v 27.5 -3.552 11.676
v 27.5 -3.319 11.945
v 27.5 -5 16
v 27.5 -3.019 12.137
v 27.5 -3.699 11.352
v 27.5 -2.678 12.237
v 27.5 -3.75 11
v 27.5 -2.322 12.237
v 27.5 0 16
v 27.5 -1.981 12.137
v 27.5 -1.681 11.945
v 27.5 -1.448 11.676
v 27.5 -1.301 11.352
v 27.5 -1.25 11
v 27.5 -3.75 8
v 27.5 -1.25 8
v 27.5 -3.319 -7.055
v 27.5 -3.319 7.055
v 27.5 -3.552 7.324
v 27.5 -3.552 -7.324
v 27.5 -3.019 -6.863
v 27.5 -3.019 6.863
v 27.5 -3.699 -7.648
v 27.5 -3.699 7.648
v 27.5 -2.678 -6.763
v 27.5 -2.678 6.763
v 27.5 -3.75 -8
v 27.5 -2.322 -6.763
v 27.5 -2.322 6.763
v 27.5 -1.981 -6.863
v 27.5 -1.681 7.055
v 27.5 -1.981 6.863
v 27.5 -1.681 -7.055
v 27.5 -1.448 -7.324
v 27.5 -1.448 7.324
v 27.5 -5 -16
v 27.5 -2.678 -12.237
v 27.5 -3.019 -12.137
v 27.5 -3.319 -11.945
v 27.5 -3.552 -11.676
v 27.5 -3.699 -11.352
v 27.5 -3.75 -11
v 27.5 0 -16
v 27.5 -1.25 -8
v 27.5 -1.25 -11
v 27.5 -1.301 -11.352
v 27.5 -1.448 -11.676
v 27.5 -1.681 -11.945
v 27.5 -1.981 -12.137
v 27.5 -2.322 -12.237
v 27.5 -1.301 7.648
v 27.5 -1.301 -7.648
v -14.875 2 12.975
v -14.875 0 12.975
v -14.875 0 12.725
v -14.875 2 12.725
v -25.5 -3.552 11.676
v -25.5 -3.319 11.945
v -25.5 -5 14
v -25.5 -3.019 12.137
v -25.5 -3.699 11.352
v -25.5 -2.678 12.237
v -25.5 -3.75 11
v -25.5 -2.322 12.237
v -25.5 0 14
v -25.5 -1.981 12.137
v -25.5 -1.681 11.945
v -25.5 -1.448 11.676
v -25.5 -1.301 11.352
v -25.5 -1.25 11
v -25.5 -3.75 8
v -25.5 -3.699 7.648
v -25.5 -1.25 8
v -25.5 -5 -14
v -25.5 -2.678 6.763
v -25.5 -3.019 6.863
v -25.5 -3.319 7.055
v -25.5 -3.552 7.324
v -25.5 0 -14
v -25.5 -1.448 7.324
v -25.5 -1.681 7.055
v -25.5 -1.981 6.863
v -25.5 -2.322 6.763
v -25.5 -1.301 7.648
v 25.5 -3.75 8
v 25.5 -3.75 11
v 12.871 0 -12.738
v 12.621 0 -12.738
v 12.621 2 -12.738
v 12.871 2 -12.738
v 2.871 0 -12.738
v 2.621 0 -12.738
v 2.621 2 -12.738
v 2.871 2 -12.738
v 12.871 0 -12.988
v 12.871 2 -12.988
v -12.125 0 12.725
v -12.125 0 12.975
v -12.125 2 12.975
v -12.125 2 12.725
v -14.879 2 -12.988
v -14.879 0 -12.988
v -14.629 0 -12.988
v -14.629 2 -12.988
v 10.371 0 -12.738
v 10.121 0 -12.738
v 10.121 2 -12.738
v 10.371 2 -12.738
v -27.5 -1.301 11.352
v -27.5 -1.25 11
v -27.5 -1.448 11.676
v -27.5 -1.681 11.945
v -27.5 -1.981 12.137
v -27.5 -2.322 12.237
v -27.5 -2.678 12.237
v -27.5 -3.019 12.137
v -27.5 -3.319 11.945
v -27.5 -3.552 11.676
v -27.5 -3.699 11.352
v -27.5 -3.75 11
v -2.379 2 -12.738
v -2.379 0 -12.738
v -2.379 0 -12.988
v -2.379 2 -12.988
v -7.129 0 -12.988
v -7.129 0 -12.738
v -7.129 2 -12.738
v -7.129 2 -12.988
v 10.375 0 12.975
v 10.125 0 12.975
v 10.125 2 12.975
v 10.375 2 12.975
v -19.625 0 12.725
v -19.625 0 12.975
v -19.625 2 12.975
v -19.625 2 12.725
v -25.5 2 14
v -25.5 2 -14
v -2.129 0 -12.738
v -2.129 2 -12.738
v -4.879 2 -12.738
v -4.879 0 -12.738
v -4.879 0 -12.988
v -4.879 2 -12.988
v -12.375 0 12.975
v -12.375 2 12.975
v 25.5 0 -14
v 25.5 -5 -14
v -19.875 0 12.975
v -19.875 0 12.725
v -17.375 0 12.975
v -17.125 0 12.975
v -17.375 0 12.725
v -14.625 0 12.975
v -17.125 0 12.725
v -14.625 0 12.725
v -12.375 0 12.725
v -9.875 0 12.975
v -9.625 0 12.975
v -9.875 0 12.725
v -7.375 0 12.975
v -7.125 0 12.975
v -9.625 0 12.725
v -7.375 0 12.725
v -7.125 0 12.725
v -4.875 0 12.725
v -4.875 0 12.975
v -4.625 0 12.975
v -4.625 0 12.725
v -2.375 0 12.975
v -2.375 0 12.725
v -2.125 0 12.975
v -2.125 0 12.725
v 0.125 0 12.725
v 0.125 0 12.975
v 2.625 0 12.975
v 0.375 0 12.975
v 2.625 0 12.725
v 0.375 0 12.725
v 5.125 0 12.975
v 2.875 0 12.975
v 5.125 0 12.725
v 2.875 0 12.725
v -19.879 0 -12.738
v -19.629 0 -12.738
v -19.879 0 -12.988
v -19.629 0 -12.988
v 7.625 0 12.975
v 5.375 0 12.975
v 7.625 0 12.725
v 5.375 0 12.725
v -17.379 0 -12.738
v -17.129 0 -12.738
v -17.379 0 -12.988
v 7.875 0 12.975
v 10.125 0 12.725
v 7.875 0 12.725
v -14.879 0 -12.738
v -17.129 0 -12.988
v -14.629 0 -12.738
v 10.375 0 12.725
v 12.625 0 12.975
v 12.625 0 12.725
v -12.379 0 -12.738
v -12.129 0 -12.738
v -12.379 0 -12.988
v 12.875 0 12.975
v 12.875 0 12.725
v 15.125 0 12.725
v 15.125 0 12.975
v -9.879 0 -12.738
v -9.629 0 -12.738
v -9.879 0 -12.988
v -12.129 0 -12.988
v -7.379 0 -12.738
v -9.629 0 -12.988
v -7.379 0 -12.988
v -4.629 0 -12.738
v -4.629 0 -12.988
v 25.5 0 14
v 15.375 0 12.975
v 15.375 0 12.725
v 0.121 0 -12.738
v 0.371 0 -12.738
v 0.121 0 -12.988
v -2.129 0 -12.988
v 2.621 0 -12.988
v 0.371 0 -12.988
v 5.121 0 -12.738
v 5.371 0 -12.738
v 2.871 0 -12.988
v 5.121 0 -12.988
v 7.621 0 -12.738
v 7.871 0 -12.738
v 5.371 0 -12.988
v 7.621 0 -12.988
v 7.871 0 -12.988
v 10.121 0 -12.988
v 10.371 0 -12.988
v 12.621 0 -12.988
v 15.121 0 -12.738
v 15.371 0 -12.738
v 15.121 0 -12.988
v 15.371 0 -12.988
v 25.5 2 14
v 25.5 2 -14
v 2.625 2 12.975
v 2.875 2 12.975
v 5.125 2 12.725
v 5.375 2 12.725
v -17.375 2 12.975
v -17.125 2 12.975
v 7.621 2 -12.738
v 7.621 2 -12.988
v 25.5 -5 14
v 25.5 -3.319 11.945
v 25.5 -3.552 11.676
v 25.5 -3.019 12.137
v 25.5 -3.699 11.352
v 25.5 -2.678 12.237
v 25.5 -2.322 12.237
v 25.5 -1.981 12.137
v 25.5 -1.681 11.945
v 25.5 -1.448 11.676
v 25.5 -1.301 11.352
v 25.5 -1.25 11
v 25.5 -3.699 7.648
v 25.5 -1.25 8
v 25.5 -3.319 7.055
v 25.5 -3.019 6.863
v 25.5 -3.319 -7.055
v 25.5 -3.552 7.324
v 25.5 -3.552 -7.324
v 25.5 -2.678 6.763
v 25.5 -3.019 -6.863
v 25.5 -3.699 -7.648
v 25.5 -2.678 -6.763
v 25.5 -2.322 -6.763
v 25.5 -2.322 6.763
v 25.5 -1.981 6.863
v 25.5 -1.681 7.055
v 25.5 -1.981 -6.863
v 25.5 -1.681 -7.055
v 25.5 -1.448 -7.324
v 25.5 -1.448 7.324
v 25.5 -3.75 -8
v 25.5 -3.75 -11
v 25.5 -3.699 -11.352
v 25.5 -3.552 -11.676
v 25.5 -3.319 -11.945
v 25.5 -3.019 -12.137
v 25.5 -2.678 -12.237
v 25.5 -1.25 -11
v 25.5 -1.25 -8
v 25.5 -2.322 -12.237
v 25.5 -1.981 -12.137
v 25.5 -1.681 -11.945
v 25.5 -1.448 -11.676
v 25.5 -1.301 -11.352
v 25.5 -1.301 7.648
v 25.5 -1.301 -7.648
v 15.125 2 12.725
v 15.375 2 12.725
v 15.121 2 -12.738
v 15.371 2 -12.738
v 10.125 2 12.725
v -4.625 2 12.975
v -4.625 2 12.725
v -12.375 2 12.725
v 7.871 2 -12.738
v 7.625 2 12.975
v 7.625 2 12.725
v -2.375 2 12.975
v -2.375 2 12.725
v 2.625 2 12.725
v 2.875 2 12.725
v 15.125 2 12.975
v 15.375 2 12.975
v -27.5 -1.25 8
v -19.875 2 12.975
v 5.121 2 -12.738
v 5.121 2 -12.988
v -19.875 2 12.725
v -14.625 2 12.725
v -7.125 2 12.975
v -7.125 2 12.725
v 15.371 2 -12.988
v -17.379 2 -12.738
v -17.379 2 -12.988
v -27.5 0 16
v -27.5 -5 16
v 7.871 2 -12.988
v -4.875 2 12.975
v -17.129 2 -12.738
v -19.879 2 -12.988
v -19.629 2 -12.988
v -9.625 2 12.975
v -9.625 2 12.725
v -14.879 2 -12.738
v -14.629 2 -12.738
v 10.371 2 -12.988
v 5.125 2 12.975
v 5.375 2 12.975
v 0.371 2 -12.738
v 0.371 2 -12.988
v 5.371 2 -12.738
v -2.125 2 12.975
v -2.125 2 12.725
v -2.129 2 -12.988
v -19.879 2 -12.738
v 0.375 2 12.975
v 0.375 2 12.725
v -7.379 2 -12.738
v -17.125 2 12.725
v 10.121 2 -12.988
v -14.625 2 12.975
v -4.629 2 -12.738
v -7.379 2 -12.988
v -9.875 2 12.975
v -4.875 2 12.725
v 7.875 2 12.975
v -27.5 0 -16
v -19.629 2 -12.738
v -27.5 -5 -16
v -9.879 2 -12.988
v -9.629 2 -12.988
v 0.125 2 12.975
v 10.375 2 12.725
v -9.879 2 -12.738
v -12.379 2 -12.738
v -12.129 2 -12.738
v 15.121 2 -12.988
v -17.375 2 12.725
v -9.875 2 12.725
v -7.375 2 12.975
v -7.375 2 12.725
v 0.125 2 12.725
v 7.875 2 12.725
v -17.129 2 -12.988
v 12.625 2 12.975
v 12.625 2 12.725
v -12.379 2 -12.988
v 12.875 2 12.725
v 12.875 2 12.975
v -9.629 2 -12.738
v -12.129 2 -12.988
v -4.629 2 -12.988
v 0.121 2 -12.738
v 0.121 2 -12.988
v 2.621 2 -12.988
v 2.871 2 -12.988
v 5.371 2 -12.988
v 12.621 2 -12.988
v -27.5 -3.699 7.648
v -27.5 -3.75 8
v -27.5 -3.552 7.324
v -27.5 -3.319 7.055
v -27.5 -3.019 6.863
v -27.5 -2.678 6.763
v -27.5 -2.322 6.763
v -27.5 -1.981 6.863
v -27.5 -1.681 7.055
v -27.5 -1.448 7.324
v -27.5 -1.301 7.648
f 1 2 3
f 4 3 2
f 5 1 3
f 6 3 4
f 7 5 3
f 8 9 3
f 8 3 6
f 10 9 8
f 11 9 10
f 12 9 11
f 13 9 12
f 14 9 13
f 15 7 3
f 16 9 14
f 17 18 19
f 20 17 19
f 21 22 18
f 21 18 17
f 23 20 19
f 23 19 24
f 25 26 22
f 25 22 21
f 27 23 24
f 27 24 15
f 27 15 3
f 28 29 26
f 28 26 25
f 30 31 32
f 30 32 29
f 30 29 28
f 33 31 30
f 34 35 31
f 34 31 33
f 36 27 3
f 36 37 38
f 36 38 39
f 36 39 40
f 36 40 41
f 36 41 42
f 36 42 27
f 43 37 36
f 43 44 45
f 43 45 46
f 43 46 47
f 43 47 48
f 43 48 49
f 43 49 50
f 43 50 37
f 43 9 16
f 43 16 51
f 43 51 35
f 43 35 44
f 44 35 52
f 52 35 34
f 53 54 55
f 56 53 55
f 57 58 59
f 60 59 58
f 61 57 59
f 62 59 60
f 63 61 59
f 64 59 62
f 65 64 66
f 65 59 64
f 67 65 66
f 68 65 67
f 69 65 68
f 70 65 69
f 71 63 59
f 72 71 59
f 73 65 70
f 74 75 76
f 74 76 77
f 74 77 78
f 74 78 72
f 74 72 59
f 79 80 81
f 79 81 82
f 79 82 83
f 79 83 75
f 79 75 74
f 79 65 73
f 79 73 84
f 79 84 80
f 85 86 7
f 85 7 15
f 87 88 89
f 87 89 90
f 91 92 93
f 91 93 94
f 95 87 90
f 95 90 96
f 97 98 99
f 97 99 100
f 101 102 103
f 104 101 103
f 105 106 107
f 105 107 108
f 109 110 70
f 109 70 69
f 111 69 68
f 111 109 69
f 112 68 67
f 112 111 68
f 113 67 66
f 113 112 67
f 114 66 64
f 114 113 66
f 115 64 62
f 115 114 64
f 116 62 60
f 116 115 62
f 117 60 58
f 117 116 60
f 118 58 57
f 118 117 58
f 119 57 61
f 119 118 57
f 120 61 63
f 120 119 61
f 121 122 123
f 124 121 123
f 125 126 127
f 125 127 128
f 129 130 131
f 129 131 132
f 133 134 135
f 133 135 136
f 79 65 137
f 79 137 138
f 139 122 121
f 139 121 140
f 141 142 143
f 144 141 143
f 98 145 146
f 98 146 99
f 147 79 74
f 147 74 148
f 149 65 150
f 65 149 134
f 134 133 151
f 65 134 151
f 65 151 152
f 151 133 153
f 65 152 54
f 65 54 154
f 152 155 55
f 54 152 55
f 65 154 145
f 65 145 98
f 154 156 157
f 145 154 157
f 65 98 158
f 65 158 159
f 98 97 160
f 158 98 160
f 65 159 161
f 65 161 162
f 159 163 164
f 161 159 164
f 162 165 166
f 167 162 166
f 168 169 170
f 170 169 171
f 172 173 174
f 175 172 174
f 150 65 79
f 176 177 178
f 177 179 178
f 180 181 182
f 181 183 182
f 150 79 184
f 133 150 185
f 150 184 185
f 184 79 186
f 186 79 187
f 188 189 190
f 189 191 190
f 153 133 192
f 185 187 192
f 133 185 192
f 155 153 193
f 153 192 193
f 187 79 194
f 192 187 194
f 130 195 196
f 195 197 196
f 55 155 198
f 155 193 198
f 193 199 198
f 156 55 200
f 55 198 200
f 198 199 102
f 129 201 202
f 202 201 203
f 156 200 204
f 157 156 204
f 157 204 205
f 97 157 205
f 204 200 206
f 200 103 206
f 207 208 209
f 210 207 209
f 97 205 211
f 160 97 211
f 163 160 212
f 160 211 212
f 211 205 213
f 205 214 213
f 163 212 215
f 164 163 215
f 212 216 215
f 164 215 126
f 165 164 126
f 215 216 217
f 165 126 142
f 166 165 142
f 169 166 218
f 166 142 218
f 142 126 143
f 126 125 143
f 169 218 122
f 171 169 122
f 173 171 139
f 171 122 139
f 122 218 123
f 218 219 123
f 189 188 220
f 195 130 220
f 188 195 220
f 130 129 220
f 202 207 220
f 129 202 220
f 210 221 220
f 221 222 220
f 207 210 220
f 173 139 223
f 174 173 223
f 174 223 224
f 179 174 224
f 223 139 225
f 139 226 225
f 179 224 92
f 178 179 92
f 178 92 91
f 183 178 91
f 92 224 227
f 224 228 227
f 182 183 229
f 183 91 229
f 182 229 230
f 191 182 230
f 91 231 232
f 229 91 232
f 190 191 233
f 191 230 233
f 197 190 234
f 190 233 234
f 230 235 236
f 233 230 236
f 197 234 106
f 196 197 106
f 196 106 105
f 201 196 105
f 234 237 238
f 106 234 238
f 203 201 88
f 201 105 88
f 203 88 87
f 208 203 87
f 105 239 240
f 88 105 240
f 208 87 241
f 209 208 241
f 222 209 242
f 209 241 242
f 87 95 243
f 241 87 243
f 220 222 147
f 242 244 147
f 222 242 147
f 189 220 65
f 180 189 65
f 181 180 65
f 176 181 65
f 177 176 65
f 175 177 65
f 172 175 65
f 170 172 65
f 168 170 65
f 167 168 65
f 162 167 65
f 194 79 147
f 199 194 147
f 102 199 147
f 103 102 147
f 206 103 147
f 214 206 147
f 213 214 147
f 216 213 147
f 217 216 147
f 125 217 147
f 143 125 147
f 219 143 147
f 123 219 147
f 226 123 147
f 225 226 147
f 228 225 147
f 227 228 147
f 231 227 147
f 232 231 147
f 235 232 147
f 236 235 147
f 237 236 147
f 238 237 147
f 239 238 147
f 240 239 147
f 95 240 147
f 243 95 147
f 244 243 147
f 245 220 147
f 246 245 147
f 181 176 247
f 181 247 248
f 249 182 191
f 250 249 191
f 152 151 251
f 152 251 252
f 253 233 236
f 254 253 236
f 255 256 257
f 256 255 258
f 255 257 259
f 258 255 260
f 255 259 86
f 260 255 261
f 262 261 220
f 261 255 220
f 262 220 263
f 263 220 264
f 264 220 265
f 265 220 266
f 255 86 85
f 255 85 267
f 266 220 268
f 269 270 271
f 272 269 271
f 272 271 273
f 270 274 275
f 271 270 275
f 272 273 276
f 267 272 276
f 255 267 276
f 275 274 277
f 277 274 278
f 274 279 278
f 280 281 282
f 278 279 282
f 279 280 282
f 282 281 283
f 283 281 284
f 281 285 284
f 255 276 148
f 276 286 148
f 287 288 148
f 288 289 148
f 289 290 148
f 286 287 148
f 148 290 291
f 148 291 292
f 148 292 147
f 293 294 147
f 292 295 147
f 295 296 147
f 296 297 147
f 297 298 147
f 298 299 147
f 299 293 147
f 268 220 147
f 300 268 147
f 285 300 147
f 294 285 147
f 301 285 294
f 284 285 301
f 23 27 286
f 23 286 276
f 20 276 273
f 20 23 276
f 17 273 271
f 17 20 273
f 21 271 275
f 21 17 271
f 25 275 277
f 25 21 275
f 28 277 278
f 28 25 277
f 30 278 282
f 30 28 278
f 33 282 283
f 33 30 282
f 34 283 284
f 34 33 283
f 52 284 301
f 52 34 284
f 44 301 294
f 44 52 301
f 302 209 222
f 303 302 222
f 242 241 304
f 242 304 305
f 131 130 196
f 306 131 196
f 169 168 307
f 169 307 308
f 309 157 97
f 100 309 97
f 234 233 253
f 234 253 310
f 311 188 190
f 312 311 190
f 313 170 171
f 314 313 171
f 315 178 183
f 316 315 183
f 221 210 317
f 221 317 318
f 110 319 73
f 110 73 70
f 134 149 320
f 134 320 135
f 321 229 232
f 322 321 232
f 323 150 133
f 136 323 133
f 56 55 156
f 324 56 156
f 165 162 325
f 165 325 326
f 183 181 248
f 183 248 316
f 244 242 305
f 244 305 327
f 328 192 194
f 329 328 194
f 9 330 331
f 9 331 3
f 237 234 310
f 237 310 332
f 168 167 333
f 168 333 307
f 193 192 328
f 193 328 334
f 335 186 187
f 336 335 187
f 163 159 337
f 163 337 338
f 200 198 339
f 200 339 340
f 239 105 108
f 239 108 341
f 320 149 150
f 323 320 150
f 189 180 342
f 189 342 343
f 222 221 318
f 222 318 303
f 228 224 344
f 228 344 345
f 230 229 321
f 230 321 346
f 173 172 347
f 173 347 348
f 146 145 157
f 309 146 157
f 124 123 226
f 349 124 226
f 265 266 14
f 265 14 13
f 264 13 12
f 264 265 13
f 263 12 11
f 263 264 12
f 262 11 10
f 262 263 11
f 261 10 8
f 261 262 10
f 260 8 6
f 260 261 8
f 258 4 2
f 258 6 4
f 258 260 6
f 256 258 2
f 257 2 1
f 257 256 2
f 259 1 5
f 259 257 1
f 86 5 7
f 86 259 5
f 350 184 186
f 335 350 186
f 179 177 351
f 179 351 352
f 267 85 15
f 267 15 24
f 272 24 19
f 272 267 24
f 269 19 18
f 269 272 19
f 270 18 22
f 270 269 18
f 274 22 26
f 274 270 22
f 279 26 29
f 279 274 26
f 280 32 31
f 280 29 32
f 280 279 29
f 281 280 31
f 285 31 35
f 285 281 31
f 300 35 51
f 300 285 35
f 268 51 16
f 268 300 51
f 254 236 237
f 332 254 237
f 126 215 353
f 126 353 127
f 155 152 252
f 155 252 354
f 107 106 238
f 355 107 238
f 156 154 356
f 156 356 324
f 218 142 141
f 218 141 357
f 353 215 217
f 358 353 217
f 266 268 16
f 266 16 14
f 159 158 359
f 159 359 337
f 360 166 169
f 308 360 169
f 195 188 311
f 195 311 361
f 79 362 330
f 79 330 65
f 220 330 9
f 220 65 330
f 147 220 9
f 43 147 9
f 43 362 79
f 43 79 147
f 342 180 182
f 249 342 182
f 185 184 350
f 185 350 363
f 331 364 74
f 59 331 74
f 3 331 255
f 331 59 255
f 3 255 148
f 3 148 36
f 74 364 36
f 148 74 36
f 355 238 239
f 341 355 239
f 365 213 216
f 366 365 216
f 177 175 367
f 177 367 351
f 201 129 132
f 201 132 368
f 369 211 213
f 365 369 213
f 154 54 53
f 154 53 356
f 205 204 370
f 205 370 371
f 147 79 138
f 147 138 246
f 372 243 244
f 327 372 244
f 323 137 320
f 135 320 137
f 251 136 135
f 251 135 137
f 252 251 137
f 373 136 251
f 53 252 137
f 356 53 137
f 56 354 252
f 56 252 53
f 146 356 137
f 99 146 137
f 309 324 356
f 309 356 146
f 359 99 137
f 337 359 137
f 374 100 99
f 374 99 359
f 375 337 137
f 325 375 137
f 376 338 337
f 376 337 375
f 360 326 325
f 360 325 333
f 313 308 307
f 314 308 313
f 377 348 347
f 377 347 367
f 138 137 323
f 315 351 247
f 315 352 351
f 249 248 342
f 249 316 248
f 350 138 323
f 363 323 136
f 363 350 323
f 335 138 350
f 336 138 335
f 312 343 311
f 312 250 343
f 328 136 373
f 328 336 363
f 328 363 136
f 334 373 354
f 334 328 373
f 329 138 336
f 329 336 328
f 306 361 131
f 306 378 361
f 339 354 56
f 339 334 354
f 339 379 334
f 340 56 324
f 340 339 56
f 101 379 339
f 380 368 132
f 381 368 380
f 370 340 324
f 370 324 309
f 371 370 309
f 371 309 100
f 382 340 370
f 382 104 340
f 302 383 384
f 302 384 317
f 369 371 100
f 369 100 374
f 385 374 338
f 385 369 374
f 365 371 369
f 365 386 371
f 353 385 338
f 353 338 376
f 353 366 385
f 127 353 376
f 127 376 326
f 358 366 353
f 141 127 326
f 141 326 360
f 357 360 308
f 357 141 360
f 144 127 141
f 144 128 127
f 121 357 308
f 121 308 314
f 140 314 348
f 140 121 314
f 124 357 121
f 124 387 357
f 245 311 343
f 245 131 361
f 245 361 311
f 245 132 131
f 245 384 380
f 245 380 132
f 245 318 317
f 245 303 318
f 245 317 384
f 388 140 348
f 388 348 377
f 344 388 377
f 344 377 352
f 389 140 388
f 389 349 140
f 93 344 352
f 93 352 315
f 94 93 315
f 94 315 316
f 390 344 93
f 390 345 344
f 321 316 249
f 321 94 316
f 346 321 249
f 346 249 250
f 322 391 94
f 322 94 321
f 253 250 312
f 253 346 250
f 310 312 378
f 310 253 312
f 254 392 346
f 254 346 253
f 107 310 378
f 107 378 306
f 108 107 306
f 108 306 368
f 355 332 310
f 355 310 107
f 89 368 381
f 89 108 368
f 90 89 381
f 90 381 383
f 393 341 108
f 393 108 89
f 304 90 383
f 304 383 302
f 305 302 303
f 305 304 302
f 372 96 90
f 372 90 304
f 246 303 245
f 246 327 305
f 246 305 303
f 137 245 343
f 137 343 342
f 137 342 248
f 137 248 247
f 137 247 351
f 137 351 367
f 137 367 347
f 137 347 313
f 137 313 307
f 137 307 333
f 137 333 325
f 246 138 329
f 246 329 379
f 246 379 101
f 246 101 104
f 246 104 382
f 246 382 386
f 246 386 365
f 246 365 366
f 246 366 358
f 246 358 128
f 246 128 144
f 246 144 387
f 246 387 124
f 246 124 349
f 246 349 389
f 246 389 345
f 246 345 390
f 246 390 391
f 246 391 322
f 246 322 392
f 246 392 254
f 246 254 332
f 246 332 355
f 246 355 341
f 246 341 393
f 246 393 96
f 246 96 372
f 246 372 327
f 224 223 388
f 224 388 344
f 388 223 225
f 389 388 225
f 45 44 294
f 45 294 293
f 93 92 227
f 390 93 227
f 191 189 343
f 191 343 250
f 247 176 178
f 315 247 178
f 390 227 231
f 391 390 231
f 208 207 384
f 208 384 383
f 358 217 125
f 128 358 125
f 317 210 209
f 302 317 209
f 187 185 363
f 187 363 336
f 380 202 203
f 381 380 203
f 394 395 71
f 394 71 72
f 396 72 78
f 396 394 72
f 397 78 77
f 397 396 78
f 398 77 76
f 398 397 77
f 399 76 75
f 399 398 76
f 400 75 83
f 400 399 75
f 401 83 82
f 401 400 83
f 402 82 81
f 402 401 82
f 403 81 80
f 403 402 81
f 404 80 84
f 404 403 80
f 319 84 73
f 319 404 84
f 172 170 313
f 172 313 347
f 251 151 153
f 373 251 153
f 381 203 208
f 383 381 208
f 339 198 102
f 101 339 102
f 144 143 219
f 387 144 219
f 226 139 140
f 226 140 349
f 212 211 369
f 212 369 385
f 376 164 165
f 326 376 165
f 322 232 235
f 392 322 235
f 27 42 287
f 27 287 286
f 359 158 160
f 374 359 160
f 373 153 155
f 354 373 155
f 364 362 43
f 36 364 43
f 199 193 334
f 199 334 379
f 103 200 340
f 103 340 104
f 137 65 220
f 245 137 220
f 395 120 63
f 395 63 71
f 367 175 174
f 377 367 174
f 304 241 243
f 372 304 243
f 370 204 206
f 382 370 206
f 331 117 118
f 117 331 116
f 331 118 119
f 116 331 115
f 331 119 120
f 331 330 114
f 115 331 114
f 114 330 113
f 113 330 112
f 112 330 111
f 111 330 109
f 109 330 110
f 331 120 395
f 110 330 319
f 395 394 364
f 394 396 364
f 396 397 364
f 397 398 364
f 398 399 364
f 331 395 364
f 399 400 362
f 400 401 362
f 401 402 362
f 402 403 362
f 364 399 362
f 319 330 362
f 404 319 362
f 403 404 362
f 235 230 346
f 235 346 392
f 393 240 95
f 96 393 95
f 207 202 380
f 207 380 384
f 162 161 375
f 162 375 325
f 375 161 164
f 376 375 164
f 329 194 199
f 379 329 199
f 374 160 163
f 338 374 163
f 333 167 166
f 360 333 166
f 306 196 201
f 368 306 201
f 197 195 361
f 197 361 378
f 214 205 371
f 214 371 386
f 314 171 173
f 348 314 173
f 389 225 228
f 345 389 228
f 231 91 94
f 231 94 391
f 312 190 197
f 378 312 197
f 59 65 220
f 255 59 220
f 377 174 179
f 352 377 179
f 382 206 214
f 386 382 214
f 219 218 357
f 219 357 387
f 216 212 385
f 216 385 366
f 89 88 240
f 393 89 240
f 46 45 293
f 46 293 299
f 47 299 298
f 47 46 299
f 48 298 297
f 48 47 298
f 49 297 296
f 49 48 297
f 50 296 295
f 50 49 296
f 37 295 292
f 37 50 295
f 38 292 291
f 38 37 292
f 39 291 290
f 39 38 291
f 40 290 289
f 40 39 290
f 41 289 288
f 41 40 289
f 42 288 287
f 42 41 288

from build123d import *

# Parameters (mm, degrees)
CROQUIS1_W              = 51
CROQUIS1_H              = 28
CROQUIS1_W_2            = 0.25
CROQUIS1_H_2            = 0.25
SALIENTE_EXTRUIR1_DEPTH = 2
CROQUIS1_3_W            = 55
CROQUIS1_3_H            = 32
SALIENTE_EXTRUIR2_DEPTH = 5
CORTAR_EXTRUIR1_DEPTH   = 70
CORTAR_EXTRUIR2_DEPTH   = 5


with BuildPart() as part:
    # Croquis1 → Saliente-Extruir1 (new body)
    with BuildSketch(Plane(origin=(0, 0, 0), x_dir=(1, 0, 0), z_dir=(0, 1, 0))):
        Rectangle(CROQUIS1_W, CROQUIS1_H)
        with Locations((-19.75, -12.85)):
            Rectangle(CROQUIS1_W_2, CROQUIS1_H_2, mode=Mode.SUBTRACT)
        with Locations((-17.25, -12.85)):
            Rectangle(CROQUIS1_W_2, CROQUIS1_H_2, mode=Mode.SUBTRACT)
        with Locations((-14.75, -12.85)):
            Rectangle(CROQUIS1_W_2, CROQUIS1_H_2, mode=Mode.SUBTRACT)
        with Locations((-12.25, -12.85)):
            Rectangle(CROQUIS1_W_2, CROQUIS1_H_2, mode=Mode.SUBTRACT)
        with Locations((-9.75, -12.85)):
            Rectangle(CROQUIS1_W_2, CROQUIS1_H_2, mode=Mode.SUBTRACT)
        with Locations((-7.25, -12.85)):
            Rectangle(CROQUIS1_W_2, CROQUIS1_H_2, mode=Mode.SUBTRACT)
        with Locations((-4.75, -12.85)):
            Rectangle(CROQUIS1_W_2, CROQUIS1_H_2, mode=Mode.SUBTRACT)
        with Locations((-2.25, -12.85)):
            Rectangle(CROQUIS1_W_2, CROQUIS1_H_2, mode=Mode.SUBTRACT)
        with Locations((0.25, -12.85)):
            Rectangle(CROQUIS1_W_2, CROQUIS1_H_2, mode=Mode.SUBTRACT)
        with Locations((2.75, -12.85)):
            Rectangle(CROQUIS1_W_2, CROQUIS1_H_2, mode=Mode.SUBTRACT)
        with Locations((5.25, -12.85)):
            Rectangle(CROQUIS1_W_2, CROQUIS1_H_2, mode=Mode.SUBTRACT)
        with Locations((7.75, -12.85)):
            Rectangle(CROQUIS1_W_2, CROQUIS1_H_2, mode=Mode.SUBTRACT)
        with Locations((10.25, -12.85)):
            Rectangle(CROQUIS1_W_2, CROQUIS1_H_2, mode=Mode.SUBTRACT)
        with Locations((12.75, -12.85)):
            Rectangle(CROQUIS1_W_2, CROQUIS1_H_2, mode=Mode.SUBTRACT)
        with Locations((15.25, -12.85)):
            Rectangle(CROQUIS1_W_2, CROQUIS1_H_2, mode=Mode.SUBTRACT)
        with Locations((15.246139204, 12.863350571)):
            Rectangle(CROQUIS1_W_2, CROQUIS1_H_2, mode=Mode.SUBTRACT)
        with Locations((-19.753860796, 12.863350571)):
            Rectangle(CROQUIS1_W_2, CROQUIS1_H_2, mode=Mode.SUBTRACT)
        with Locations((-17.253860796, 12.863350571)):
            Rectangle(CROQUIS1_W_2, CROQUIS1_H_2, mode=Mode.SUBTRACT)
        with Locations((-14.753860796, 12.863350571)):
            Rectangle(CROQUIS1_W_2, CROQUIS1_H_2, mode=Mode.SUBTRACT)
        with Locations((-12.253860796, 12.863350571)):
            Rectangle(CROQUIS1_W_2, CROQUIS1_H_2, mode=Mode.SUBTRACT)
        with Locations((-9.753860796, 12.863350571)):
            Rectangle(CROQUIS1_W_2, CROQUIS1_H_2, mode=Mode.SUBTRACT)
        with Locations((-7.253860796, 12.863350571)):
            Rectangle(CROQUIS1_W_2, CROQUIS1_H_2, mode=Mode.SUBTRACT)
        with Locations((-4.753860796, 12.863350571)):
            Rectangle(CROQUIS1_W_2, CROQUIS1_H_2, mode=Mode.SUBTRACT)
        with Locations((-2.253860796, 12.863350571)):
            Rectangle(CROQUIS1_W_2, CROQUIS1_H_2, mode=Mode.SUBTRACT)
        with Locations((0.246139204, 12.863350571)):
            Rectangle(CROQUIS1_W_2, CROQUIS1_H_2, mode=Mode.SUBTRACT)
        with Locations((2.746139204, 12.863350571)):
            Rectangle(CROQUIS1_W_2, CROQUIS1_H_2, mode=Mode.SUBTRACT)
        with Locations((5.246139204, 12.863350571)):
            Rectangle(CROQUIS1_W_2, CROQUIS1_H_2, mode=Mode.SUBTRACT)
        with Locations((7.746139204, 12.863350571)):
            Rectangle(CROQUIS1_W_2, CROQUIS1_H_2, mode=Mode.SUBTRACT)
        with Locations((10.246139204, 12.863350571)):
            Rectangle(CROQUIS1_W_2, CROQUIS1_H_2, mode=Mode.SUBTRACT)
        with Locations((12.746139204, 12.863350571)):
            Rectangle(CROQUIS1_W_2, CROQUIS1_H_2, mode=Mode.SUBTRACT)
    extrude(amount=SALIENTE_EXTRUIR1_DEPTH)


with BuildPart() as body_2:
    # Croquis1<3> → Saliente-Extruir2 (new body)
    with BuildSketch(Plane(origin=(0, 0, 0), x_dir=(1, 0, 0), z_dir=(0, 1, 0))):
        Rectangle(CROQUIS1_3_W, CROQUIS1_3_H)
        Polygon((25.5, 14), (25.5, -14), (16.5, -14), (-21, -14), (-25.5, -14), (-25.5, 14), (-21, 14), (16.5, 14), align=None, mode=Mode.SUBTRACT)
    extrude(amount=-SALIENTE_EXTRUIR2_DEPTH)

    # Croquis2 → Cortar-Extruir1 (cut)
    with BuildSketch(Plane.ZY.offset(27.5)):
        with BuildLine():
            Line((8, -1.25), (11, -1.25))
            ThreePointArc((11, -1.25), (12.25, -2.5), (11, -3.75))
            Line((11, -3.75), (8, -3.75))
            ThreePointArc((8, -3.75), (6.75, -2.5), (8, -1.25))
        make_face()
    extrude(amount=-CORTAR_EXTRUIR1_DEPTH, mode=Mode.SUBTRACT)

    # Croquis3 → Cortar-Extruir2 (cut)
    with BuildSketch(Plane(origin=(27.5, 0, 0), x_dir=(0, 0, -1), z_dir=(1, 0, 0))):
        with BuildLine():
            Line((8, -1.25), (11, -1.25))
            ThreePointArc((11, -1.25), (12.25, -2.5), (11, -3.75))
            Line((11, -3.75), (8, -3.75))
            ThreePointArc((8, -3.75), (6.75, -2.5), (8, -1.25))
        make_face()
    extrude(amount=-CORTAR_EXTRUIR2_DEPTH, mode=Mode.SUBTRACT)


solid = Compound([part.part, body_2.part])
